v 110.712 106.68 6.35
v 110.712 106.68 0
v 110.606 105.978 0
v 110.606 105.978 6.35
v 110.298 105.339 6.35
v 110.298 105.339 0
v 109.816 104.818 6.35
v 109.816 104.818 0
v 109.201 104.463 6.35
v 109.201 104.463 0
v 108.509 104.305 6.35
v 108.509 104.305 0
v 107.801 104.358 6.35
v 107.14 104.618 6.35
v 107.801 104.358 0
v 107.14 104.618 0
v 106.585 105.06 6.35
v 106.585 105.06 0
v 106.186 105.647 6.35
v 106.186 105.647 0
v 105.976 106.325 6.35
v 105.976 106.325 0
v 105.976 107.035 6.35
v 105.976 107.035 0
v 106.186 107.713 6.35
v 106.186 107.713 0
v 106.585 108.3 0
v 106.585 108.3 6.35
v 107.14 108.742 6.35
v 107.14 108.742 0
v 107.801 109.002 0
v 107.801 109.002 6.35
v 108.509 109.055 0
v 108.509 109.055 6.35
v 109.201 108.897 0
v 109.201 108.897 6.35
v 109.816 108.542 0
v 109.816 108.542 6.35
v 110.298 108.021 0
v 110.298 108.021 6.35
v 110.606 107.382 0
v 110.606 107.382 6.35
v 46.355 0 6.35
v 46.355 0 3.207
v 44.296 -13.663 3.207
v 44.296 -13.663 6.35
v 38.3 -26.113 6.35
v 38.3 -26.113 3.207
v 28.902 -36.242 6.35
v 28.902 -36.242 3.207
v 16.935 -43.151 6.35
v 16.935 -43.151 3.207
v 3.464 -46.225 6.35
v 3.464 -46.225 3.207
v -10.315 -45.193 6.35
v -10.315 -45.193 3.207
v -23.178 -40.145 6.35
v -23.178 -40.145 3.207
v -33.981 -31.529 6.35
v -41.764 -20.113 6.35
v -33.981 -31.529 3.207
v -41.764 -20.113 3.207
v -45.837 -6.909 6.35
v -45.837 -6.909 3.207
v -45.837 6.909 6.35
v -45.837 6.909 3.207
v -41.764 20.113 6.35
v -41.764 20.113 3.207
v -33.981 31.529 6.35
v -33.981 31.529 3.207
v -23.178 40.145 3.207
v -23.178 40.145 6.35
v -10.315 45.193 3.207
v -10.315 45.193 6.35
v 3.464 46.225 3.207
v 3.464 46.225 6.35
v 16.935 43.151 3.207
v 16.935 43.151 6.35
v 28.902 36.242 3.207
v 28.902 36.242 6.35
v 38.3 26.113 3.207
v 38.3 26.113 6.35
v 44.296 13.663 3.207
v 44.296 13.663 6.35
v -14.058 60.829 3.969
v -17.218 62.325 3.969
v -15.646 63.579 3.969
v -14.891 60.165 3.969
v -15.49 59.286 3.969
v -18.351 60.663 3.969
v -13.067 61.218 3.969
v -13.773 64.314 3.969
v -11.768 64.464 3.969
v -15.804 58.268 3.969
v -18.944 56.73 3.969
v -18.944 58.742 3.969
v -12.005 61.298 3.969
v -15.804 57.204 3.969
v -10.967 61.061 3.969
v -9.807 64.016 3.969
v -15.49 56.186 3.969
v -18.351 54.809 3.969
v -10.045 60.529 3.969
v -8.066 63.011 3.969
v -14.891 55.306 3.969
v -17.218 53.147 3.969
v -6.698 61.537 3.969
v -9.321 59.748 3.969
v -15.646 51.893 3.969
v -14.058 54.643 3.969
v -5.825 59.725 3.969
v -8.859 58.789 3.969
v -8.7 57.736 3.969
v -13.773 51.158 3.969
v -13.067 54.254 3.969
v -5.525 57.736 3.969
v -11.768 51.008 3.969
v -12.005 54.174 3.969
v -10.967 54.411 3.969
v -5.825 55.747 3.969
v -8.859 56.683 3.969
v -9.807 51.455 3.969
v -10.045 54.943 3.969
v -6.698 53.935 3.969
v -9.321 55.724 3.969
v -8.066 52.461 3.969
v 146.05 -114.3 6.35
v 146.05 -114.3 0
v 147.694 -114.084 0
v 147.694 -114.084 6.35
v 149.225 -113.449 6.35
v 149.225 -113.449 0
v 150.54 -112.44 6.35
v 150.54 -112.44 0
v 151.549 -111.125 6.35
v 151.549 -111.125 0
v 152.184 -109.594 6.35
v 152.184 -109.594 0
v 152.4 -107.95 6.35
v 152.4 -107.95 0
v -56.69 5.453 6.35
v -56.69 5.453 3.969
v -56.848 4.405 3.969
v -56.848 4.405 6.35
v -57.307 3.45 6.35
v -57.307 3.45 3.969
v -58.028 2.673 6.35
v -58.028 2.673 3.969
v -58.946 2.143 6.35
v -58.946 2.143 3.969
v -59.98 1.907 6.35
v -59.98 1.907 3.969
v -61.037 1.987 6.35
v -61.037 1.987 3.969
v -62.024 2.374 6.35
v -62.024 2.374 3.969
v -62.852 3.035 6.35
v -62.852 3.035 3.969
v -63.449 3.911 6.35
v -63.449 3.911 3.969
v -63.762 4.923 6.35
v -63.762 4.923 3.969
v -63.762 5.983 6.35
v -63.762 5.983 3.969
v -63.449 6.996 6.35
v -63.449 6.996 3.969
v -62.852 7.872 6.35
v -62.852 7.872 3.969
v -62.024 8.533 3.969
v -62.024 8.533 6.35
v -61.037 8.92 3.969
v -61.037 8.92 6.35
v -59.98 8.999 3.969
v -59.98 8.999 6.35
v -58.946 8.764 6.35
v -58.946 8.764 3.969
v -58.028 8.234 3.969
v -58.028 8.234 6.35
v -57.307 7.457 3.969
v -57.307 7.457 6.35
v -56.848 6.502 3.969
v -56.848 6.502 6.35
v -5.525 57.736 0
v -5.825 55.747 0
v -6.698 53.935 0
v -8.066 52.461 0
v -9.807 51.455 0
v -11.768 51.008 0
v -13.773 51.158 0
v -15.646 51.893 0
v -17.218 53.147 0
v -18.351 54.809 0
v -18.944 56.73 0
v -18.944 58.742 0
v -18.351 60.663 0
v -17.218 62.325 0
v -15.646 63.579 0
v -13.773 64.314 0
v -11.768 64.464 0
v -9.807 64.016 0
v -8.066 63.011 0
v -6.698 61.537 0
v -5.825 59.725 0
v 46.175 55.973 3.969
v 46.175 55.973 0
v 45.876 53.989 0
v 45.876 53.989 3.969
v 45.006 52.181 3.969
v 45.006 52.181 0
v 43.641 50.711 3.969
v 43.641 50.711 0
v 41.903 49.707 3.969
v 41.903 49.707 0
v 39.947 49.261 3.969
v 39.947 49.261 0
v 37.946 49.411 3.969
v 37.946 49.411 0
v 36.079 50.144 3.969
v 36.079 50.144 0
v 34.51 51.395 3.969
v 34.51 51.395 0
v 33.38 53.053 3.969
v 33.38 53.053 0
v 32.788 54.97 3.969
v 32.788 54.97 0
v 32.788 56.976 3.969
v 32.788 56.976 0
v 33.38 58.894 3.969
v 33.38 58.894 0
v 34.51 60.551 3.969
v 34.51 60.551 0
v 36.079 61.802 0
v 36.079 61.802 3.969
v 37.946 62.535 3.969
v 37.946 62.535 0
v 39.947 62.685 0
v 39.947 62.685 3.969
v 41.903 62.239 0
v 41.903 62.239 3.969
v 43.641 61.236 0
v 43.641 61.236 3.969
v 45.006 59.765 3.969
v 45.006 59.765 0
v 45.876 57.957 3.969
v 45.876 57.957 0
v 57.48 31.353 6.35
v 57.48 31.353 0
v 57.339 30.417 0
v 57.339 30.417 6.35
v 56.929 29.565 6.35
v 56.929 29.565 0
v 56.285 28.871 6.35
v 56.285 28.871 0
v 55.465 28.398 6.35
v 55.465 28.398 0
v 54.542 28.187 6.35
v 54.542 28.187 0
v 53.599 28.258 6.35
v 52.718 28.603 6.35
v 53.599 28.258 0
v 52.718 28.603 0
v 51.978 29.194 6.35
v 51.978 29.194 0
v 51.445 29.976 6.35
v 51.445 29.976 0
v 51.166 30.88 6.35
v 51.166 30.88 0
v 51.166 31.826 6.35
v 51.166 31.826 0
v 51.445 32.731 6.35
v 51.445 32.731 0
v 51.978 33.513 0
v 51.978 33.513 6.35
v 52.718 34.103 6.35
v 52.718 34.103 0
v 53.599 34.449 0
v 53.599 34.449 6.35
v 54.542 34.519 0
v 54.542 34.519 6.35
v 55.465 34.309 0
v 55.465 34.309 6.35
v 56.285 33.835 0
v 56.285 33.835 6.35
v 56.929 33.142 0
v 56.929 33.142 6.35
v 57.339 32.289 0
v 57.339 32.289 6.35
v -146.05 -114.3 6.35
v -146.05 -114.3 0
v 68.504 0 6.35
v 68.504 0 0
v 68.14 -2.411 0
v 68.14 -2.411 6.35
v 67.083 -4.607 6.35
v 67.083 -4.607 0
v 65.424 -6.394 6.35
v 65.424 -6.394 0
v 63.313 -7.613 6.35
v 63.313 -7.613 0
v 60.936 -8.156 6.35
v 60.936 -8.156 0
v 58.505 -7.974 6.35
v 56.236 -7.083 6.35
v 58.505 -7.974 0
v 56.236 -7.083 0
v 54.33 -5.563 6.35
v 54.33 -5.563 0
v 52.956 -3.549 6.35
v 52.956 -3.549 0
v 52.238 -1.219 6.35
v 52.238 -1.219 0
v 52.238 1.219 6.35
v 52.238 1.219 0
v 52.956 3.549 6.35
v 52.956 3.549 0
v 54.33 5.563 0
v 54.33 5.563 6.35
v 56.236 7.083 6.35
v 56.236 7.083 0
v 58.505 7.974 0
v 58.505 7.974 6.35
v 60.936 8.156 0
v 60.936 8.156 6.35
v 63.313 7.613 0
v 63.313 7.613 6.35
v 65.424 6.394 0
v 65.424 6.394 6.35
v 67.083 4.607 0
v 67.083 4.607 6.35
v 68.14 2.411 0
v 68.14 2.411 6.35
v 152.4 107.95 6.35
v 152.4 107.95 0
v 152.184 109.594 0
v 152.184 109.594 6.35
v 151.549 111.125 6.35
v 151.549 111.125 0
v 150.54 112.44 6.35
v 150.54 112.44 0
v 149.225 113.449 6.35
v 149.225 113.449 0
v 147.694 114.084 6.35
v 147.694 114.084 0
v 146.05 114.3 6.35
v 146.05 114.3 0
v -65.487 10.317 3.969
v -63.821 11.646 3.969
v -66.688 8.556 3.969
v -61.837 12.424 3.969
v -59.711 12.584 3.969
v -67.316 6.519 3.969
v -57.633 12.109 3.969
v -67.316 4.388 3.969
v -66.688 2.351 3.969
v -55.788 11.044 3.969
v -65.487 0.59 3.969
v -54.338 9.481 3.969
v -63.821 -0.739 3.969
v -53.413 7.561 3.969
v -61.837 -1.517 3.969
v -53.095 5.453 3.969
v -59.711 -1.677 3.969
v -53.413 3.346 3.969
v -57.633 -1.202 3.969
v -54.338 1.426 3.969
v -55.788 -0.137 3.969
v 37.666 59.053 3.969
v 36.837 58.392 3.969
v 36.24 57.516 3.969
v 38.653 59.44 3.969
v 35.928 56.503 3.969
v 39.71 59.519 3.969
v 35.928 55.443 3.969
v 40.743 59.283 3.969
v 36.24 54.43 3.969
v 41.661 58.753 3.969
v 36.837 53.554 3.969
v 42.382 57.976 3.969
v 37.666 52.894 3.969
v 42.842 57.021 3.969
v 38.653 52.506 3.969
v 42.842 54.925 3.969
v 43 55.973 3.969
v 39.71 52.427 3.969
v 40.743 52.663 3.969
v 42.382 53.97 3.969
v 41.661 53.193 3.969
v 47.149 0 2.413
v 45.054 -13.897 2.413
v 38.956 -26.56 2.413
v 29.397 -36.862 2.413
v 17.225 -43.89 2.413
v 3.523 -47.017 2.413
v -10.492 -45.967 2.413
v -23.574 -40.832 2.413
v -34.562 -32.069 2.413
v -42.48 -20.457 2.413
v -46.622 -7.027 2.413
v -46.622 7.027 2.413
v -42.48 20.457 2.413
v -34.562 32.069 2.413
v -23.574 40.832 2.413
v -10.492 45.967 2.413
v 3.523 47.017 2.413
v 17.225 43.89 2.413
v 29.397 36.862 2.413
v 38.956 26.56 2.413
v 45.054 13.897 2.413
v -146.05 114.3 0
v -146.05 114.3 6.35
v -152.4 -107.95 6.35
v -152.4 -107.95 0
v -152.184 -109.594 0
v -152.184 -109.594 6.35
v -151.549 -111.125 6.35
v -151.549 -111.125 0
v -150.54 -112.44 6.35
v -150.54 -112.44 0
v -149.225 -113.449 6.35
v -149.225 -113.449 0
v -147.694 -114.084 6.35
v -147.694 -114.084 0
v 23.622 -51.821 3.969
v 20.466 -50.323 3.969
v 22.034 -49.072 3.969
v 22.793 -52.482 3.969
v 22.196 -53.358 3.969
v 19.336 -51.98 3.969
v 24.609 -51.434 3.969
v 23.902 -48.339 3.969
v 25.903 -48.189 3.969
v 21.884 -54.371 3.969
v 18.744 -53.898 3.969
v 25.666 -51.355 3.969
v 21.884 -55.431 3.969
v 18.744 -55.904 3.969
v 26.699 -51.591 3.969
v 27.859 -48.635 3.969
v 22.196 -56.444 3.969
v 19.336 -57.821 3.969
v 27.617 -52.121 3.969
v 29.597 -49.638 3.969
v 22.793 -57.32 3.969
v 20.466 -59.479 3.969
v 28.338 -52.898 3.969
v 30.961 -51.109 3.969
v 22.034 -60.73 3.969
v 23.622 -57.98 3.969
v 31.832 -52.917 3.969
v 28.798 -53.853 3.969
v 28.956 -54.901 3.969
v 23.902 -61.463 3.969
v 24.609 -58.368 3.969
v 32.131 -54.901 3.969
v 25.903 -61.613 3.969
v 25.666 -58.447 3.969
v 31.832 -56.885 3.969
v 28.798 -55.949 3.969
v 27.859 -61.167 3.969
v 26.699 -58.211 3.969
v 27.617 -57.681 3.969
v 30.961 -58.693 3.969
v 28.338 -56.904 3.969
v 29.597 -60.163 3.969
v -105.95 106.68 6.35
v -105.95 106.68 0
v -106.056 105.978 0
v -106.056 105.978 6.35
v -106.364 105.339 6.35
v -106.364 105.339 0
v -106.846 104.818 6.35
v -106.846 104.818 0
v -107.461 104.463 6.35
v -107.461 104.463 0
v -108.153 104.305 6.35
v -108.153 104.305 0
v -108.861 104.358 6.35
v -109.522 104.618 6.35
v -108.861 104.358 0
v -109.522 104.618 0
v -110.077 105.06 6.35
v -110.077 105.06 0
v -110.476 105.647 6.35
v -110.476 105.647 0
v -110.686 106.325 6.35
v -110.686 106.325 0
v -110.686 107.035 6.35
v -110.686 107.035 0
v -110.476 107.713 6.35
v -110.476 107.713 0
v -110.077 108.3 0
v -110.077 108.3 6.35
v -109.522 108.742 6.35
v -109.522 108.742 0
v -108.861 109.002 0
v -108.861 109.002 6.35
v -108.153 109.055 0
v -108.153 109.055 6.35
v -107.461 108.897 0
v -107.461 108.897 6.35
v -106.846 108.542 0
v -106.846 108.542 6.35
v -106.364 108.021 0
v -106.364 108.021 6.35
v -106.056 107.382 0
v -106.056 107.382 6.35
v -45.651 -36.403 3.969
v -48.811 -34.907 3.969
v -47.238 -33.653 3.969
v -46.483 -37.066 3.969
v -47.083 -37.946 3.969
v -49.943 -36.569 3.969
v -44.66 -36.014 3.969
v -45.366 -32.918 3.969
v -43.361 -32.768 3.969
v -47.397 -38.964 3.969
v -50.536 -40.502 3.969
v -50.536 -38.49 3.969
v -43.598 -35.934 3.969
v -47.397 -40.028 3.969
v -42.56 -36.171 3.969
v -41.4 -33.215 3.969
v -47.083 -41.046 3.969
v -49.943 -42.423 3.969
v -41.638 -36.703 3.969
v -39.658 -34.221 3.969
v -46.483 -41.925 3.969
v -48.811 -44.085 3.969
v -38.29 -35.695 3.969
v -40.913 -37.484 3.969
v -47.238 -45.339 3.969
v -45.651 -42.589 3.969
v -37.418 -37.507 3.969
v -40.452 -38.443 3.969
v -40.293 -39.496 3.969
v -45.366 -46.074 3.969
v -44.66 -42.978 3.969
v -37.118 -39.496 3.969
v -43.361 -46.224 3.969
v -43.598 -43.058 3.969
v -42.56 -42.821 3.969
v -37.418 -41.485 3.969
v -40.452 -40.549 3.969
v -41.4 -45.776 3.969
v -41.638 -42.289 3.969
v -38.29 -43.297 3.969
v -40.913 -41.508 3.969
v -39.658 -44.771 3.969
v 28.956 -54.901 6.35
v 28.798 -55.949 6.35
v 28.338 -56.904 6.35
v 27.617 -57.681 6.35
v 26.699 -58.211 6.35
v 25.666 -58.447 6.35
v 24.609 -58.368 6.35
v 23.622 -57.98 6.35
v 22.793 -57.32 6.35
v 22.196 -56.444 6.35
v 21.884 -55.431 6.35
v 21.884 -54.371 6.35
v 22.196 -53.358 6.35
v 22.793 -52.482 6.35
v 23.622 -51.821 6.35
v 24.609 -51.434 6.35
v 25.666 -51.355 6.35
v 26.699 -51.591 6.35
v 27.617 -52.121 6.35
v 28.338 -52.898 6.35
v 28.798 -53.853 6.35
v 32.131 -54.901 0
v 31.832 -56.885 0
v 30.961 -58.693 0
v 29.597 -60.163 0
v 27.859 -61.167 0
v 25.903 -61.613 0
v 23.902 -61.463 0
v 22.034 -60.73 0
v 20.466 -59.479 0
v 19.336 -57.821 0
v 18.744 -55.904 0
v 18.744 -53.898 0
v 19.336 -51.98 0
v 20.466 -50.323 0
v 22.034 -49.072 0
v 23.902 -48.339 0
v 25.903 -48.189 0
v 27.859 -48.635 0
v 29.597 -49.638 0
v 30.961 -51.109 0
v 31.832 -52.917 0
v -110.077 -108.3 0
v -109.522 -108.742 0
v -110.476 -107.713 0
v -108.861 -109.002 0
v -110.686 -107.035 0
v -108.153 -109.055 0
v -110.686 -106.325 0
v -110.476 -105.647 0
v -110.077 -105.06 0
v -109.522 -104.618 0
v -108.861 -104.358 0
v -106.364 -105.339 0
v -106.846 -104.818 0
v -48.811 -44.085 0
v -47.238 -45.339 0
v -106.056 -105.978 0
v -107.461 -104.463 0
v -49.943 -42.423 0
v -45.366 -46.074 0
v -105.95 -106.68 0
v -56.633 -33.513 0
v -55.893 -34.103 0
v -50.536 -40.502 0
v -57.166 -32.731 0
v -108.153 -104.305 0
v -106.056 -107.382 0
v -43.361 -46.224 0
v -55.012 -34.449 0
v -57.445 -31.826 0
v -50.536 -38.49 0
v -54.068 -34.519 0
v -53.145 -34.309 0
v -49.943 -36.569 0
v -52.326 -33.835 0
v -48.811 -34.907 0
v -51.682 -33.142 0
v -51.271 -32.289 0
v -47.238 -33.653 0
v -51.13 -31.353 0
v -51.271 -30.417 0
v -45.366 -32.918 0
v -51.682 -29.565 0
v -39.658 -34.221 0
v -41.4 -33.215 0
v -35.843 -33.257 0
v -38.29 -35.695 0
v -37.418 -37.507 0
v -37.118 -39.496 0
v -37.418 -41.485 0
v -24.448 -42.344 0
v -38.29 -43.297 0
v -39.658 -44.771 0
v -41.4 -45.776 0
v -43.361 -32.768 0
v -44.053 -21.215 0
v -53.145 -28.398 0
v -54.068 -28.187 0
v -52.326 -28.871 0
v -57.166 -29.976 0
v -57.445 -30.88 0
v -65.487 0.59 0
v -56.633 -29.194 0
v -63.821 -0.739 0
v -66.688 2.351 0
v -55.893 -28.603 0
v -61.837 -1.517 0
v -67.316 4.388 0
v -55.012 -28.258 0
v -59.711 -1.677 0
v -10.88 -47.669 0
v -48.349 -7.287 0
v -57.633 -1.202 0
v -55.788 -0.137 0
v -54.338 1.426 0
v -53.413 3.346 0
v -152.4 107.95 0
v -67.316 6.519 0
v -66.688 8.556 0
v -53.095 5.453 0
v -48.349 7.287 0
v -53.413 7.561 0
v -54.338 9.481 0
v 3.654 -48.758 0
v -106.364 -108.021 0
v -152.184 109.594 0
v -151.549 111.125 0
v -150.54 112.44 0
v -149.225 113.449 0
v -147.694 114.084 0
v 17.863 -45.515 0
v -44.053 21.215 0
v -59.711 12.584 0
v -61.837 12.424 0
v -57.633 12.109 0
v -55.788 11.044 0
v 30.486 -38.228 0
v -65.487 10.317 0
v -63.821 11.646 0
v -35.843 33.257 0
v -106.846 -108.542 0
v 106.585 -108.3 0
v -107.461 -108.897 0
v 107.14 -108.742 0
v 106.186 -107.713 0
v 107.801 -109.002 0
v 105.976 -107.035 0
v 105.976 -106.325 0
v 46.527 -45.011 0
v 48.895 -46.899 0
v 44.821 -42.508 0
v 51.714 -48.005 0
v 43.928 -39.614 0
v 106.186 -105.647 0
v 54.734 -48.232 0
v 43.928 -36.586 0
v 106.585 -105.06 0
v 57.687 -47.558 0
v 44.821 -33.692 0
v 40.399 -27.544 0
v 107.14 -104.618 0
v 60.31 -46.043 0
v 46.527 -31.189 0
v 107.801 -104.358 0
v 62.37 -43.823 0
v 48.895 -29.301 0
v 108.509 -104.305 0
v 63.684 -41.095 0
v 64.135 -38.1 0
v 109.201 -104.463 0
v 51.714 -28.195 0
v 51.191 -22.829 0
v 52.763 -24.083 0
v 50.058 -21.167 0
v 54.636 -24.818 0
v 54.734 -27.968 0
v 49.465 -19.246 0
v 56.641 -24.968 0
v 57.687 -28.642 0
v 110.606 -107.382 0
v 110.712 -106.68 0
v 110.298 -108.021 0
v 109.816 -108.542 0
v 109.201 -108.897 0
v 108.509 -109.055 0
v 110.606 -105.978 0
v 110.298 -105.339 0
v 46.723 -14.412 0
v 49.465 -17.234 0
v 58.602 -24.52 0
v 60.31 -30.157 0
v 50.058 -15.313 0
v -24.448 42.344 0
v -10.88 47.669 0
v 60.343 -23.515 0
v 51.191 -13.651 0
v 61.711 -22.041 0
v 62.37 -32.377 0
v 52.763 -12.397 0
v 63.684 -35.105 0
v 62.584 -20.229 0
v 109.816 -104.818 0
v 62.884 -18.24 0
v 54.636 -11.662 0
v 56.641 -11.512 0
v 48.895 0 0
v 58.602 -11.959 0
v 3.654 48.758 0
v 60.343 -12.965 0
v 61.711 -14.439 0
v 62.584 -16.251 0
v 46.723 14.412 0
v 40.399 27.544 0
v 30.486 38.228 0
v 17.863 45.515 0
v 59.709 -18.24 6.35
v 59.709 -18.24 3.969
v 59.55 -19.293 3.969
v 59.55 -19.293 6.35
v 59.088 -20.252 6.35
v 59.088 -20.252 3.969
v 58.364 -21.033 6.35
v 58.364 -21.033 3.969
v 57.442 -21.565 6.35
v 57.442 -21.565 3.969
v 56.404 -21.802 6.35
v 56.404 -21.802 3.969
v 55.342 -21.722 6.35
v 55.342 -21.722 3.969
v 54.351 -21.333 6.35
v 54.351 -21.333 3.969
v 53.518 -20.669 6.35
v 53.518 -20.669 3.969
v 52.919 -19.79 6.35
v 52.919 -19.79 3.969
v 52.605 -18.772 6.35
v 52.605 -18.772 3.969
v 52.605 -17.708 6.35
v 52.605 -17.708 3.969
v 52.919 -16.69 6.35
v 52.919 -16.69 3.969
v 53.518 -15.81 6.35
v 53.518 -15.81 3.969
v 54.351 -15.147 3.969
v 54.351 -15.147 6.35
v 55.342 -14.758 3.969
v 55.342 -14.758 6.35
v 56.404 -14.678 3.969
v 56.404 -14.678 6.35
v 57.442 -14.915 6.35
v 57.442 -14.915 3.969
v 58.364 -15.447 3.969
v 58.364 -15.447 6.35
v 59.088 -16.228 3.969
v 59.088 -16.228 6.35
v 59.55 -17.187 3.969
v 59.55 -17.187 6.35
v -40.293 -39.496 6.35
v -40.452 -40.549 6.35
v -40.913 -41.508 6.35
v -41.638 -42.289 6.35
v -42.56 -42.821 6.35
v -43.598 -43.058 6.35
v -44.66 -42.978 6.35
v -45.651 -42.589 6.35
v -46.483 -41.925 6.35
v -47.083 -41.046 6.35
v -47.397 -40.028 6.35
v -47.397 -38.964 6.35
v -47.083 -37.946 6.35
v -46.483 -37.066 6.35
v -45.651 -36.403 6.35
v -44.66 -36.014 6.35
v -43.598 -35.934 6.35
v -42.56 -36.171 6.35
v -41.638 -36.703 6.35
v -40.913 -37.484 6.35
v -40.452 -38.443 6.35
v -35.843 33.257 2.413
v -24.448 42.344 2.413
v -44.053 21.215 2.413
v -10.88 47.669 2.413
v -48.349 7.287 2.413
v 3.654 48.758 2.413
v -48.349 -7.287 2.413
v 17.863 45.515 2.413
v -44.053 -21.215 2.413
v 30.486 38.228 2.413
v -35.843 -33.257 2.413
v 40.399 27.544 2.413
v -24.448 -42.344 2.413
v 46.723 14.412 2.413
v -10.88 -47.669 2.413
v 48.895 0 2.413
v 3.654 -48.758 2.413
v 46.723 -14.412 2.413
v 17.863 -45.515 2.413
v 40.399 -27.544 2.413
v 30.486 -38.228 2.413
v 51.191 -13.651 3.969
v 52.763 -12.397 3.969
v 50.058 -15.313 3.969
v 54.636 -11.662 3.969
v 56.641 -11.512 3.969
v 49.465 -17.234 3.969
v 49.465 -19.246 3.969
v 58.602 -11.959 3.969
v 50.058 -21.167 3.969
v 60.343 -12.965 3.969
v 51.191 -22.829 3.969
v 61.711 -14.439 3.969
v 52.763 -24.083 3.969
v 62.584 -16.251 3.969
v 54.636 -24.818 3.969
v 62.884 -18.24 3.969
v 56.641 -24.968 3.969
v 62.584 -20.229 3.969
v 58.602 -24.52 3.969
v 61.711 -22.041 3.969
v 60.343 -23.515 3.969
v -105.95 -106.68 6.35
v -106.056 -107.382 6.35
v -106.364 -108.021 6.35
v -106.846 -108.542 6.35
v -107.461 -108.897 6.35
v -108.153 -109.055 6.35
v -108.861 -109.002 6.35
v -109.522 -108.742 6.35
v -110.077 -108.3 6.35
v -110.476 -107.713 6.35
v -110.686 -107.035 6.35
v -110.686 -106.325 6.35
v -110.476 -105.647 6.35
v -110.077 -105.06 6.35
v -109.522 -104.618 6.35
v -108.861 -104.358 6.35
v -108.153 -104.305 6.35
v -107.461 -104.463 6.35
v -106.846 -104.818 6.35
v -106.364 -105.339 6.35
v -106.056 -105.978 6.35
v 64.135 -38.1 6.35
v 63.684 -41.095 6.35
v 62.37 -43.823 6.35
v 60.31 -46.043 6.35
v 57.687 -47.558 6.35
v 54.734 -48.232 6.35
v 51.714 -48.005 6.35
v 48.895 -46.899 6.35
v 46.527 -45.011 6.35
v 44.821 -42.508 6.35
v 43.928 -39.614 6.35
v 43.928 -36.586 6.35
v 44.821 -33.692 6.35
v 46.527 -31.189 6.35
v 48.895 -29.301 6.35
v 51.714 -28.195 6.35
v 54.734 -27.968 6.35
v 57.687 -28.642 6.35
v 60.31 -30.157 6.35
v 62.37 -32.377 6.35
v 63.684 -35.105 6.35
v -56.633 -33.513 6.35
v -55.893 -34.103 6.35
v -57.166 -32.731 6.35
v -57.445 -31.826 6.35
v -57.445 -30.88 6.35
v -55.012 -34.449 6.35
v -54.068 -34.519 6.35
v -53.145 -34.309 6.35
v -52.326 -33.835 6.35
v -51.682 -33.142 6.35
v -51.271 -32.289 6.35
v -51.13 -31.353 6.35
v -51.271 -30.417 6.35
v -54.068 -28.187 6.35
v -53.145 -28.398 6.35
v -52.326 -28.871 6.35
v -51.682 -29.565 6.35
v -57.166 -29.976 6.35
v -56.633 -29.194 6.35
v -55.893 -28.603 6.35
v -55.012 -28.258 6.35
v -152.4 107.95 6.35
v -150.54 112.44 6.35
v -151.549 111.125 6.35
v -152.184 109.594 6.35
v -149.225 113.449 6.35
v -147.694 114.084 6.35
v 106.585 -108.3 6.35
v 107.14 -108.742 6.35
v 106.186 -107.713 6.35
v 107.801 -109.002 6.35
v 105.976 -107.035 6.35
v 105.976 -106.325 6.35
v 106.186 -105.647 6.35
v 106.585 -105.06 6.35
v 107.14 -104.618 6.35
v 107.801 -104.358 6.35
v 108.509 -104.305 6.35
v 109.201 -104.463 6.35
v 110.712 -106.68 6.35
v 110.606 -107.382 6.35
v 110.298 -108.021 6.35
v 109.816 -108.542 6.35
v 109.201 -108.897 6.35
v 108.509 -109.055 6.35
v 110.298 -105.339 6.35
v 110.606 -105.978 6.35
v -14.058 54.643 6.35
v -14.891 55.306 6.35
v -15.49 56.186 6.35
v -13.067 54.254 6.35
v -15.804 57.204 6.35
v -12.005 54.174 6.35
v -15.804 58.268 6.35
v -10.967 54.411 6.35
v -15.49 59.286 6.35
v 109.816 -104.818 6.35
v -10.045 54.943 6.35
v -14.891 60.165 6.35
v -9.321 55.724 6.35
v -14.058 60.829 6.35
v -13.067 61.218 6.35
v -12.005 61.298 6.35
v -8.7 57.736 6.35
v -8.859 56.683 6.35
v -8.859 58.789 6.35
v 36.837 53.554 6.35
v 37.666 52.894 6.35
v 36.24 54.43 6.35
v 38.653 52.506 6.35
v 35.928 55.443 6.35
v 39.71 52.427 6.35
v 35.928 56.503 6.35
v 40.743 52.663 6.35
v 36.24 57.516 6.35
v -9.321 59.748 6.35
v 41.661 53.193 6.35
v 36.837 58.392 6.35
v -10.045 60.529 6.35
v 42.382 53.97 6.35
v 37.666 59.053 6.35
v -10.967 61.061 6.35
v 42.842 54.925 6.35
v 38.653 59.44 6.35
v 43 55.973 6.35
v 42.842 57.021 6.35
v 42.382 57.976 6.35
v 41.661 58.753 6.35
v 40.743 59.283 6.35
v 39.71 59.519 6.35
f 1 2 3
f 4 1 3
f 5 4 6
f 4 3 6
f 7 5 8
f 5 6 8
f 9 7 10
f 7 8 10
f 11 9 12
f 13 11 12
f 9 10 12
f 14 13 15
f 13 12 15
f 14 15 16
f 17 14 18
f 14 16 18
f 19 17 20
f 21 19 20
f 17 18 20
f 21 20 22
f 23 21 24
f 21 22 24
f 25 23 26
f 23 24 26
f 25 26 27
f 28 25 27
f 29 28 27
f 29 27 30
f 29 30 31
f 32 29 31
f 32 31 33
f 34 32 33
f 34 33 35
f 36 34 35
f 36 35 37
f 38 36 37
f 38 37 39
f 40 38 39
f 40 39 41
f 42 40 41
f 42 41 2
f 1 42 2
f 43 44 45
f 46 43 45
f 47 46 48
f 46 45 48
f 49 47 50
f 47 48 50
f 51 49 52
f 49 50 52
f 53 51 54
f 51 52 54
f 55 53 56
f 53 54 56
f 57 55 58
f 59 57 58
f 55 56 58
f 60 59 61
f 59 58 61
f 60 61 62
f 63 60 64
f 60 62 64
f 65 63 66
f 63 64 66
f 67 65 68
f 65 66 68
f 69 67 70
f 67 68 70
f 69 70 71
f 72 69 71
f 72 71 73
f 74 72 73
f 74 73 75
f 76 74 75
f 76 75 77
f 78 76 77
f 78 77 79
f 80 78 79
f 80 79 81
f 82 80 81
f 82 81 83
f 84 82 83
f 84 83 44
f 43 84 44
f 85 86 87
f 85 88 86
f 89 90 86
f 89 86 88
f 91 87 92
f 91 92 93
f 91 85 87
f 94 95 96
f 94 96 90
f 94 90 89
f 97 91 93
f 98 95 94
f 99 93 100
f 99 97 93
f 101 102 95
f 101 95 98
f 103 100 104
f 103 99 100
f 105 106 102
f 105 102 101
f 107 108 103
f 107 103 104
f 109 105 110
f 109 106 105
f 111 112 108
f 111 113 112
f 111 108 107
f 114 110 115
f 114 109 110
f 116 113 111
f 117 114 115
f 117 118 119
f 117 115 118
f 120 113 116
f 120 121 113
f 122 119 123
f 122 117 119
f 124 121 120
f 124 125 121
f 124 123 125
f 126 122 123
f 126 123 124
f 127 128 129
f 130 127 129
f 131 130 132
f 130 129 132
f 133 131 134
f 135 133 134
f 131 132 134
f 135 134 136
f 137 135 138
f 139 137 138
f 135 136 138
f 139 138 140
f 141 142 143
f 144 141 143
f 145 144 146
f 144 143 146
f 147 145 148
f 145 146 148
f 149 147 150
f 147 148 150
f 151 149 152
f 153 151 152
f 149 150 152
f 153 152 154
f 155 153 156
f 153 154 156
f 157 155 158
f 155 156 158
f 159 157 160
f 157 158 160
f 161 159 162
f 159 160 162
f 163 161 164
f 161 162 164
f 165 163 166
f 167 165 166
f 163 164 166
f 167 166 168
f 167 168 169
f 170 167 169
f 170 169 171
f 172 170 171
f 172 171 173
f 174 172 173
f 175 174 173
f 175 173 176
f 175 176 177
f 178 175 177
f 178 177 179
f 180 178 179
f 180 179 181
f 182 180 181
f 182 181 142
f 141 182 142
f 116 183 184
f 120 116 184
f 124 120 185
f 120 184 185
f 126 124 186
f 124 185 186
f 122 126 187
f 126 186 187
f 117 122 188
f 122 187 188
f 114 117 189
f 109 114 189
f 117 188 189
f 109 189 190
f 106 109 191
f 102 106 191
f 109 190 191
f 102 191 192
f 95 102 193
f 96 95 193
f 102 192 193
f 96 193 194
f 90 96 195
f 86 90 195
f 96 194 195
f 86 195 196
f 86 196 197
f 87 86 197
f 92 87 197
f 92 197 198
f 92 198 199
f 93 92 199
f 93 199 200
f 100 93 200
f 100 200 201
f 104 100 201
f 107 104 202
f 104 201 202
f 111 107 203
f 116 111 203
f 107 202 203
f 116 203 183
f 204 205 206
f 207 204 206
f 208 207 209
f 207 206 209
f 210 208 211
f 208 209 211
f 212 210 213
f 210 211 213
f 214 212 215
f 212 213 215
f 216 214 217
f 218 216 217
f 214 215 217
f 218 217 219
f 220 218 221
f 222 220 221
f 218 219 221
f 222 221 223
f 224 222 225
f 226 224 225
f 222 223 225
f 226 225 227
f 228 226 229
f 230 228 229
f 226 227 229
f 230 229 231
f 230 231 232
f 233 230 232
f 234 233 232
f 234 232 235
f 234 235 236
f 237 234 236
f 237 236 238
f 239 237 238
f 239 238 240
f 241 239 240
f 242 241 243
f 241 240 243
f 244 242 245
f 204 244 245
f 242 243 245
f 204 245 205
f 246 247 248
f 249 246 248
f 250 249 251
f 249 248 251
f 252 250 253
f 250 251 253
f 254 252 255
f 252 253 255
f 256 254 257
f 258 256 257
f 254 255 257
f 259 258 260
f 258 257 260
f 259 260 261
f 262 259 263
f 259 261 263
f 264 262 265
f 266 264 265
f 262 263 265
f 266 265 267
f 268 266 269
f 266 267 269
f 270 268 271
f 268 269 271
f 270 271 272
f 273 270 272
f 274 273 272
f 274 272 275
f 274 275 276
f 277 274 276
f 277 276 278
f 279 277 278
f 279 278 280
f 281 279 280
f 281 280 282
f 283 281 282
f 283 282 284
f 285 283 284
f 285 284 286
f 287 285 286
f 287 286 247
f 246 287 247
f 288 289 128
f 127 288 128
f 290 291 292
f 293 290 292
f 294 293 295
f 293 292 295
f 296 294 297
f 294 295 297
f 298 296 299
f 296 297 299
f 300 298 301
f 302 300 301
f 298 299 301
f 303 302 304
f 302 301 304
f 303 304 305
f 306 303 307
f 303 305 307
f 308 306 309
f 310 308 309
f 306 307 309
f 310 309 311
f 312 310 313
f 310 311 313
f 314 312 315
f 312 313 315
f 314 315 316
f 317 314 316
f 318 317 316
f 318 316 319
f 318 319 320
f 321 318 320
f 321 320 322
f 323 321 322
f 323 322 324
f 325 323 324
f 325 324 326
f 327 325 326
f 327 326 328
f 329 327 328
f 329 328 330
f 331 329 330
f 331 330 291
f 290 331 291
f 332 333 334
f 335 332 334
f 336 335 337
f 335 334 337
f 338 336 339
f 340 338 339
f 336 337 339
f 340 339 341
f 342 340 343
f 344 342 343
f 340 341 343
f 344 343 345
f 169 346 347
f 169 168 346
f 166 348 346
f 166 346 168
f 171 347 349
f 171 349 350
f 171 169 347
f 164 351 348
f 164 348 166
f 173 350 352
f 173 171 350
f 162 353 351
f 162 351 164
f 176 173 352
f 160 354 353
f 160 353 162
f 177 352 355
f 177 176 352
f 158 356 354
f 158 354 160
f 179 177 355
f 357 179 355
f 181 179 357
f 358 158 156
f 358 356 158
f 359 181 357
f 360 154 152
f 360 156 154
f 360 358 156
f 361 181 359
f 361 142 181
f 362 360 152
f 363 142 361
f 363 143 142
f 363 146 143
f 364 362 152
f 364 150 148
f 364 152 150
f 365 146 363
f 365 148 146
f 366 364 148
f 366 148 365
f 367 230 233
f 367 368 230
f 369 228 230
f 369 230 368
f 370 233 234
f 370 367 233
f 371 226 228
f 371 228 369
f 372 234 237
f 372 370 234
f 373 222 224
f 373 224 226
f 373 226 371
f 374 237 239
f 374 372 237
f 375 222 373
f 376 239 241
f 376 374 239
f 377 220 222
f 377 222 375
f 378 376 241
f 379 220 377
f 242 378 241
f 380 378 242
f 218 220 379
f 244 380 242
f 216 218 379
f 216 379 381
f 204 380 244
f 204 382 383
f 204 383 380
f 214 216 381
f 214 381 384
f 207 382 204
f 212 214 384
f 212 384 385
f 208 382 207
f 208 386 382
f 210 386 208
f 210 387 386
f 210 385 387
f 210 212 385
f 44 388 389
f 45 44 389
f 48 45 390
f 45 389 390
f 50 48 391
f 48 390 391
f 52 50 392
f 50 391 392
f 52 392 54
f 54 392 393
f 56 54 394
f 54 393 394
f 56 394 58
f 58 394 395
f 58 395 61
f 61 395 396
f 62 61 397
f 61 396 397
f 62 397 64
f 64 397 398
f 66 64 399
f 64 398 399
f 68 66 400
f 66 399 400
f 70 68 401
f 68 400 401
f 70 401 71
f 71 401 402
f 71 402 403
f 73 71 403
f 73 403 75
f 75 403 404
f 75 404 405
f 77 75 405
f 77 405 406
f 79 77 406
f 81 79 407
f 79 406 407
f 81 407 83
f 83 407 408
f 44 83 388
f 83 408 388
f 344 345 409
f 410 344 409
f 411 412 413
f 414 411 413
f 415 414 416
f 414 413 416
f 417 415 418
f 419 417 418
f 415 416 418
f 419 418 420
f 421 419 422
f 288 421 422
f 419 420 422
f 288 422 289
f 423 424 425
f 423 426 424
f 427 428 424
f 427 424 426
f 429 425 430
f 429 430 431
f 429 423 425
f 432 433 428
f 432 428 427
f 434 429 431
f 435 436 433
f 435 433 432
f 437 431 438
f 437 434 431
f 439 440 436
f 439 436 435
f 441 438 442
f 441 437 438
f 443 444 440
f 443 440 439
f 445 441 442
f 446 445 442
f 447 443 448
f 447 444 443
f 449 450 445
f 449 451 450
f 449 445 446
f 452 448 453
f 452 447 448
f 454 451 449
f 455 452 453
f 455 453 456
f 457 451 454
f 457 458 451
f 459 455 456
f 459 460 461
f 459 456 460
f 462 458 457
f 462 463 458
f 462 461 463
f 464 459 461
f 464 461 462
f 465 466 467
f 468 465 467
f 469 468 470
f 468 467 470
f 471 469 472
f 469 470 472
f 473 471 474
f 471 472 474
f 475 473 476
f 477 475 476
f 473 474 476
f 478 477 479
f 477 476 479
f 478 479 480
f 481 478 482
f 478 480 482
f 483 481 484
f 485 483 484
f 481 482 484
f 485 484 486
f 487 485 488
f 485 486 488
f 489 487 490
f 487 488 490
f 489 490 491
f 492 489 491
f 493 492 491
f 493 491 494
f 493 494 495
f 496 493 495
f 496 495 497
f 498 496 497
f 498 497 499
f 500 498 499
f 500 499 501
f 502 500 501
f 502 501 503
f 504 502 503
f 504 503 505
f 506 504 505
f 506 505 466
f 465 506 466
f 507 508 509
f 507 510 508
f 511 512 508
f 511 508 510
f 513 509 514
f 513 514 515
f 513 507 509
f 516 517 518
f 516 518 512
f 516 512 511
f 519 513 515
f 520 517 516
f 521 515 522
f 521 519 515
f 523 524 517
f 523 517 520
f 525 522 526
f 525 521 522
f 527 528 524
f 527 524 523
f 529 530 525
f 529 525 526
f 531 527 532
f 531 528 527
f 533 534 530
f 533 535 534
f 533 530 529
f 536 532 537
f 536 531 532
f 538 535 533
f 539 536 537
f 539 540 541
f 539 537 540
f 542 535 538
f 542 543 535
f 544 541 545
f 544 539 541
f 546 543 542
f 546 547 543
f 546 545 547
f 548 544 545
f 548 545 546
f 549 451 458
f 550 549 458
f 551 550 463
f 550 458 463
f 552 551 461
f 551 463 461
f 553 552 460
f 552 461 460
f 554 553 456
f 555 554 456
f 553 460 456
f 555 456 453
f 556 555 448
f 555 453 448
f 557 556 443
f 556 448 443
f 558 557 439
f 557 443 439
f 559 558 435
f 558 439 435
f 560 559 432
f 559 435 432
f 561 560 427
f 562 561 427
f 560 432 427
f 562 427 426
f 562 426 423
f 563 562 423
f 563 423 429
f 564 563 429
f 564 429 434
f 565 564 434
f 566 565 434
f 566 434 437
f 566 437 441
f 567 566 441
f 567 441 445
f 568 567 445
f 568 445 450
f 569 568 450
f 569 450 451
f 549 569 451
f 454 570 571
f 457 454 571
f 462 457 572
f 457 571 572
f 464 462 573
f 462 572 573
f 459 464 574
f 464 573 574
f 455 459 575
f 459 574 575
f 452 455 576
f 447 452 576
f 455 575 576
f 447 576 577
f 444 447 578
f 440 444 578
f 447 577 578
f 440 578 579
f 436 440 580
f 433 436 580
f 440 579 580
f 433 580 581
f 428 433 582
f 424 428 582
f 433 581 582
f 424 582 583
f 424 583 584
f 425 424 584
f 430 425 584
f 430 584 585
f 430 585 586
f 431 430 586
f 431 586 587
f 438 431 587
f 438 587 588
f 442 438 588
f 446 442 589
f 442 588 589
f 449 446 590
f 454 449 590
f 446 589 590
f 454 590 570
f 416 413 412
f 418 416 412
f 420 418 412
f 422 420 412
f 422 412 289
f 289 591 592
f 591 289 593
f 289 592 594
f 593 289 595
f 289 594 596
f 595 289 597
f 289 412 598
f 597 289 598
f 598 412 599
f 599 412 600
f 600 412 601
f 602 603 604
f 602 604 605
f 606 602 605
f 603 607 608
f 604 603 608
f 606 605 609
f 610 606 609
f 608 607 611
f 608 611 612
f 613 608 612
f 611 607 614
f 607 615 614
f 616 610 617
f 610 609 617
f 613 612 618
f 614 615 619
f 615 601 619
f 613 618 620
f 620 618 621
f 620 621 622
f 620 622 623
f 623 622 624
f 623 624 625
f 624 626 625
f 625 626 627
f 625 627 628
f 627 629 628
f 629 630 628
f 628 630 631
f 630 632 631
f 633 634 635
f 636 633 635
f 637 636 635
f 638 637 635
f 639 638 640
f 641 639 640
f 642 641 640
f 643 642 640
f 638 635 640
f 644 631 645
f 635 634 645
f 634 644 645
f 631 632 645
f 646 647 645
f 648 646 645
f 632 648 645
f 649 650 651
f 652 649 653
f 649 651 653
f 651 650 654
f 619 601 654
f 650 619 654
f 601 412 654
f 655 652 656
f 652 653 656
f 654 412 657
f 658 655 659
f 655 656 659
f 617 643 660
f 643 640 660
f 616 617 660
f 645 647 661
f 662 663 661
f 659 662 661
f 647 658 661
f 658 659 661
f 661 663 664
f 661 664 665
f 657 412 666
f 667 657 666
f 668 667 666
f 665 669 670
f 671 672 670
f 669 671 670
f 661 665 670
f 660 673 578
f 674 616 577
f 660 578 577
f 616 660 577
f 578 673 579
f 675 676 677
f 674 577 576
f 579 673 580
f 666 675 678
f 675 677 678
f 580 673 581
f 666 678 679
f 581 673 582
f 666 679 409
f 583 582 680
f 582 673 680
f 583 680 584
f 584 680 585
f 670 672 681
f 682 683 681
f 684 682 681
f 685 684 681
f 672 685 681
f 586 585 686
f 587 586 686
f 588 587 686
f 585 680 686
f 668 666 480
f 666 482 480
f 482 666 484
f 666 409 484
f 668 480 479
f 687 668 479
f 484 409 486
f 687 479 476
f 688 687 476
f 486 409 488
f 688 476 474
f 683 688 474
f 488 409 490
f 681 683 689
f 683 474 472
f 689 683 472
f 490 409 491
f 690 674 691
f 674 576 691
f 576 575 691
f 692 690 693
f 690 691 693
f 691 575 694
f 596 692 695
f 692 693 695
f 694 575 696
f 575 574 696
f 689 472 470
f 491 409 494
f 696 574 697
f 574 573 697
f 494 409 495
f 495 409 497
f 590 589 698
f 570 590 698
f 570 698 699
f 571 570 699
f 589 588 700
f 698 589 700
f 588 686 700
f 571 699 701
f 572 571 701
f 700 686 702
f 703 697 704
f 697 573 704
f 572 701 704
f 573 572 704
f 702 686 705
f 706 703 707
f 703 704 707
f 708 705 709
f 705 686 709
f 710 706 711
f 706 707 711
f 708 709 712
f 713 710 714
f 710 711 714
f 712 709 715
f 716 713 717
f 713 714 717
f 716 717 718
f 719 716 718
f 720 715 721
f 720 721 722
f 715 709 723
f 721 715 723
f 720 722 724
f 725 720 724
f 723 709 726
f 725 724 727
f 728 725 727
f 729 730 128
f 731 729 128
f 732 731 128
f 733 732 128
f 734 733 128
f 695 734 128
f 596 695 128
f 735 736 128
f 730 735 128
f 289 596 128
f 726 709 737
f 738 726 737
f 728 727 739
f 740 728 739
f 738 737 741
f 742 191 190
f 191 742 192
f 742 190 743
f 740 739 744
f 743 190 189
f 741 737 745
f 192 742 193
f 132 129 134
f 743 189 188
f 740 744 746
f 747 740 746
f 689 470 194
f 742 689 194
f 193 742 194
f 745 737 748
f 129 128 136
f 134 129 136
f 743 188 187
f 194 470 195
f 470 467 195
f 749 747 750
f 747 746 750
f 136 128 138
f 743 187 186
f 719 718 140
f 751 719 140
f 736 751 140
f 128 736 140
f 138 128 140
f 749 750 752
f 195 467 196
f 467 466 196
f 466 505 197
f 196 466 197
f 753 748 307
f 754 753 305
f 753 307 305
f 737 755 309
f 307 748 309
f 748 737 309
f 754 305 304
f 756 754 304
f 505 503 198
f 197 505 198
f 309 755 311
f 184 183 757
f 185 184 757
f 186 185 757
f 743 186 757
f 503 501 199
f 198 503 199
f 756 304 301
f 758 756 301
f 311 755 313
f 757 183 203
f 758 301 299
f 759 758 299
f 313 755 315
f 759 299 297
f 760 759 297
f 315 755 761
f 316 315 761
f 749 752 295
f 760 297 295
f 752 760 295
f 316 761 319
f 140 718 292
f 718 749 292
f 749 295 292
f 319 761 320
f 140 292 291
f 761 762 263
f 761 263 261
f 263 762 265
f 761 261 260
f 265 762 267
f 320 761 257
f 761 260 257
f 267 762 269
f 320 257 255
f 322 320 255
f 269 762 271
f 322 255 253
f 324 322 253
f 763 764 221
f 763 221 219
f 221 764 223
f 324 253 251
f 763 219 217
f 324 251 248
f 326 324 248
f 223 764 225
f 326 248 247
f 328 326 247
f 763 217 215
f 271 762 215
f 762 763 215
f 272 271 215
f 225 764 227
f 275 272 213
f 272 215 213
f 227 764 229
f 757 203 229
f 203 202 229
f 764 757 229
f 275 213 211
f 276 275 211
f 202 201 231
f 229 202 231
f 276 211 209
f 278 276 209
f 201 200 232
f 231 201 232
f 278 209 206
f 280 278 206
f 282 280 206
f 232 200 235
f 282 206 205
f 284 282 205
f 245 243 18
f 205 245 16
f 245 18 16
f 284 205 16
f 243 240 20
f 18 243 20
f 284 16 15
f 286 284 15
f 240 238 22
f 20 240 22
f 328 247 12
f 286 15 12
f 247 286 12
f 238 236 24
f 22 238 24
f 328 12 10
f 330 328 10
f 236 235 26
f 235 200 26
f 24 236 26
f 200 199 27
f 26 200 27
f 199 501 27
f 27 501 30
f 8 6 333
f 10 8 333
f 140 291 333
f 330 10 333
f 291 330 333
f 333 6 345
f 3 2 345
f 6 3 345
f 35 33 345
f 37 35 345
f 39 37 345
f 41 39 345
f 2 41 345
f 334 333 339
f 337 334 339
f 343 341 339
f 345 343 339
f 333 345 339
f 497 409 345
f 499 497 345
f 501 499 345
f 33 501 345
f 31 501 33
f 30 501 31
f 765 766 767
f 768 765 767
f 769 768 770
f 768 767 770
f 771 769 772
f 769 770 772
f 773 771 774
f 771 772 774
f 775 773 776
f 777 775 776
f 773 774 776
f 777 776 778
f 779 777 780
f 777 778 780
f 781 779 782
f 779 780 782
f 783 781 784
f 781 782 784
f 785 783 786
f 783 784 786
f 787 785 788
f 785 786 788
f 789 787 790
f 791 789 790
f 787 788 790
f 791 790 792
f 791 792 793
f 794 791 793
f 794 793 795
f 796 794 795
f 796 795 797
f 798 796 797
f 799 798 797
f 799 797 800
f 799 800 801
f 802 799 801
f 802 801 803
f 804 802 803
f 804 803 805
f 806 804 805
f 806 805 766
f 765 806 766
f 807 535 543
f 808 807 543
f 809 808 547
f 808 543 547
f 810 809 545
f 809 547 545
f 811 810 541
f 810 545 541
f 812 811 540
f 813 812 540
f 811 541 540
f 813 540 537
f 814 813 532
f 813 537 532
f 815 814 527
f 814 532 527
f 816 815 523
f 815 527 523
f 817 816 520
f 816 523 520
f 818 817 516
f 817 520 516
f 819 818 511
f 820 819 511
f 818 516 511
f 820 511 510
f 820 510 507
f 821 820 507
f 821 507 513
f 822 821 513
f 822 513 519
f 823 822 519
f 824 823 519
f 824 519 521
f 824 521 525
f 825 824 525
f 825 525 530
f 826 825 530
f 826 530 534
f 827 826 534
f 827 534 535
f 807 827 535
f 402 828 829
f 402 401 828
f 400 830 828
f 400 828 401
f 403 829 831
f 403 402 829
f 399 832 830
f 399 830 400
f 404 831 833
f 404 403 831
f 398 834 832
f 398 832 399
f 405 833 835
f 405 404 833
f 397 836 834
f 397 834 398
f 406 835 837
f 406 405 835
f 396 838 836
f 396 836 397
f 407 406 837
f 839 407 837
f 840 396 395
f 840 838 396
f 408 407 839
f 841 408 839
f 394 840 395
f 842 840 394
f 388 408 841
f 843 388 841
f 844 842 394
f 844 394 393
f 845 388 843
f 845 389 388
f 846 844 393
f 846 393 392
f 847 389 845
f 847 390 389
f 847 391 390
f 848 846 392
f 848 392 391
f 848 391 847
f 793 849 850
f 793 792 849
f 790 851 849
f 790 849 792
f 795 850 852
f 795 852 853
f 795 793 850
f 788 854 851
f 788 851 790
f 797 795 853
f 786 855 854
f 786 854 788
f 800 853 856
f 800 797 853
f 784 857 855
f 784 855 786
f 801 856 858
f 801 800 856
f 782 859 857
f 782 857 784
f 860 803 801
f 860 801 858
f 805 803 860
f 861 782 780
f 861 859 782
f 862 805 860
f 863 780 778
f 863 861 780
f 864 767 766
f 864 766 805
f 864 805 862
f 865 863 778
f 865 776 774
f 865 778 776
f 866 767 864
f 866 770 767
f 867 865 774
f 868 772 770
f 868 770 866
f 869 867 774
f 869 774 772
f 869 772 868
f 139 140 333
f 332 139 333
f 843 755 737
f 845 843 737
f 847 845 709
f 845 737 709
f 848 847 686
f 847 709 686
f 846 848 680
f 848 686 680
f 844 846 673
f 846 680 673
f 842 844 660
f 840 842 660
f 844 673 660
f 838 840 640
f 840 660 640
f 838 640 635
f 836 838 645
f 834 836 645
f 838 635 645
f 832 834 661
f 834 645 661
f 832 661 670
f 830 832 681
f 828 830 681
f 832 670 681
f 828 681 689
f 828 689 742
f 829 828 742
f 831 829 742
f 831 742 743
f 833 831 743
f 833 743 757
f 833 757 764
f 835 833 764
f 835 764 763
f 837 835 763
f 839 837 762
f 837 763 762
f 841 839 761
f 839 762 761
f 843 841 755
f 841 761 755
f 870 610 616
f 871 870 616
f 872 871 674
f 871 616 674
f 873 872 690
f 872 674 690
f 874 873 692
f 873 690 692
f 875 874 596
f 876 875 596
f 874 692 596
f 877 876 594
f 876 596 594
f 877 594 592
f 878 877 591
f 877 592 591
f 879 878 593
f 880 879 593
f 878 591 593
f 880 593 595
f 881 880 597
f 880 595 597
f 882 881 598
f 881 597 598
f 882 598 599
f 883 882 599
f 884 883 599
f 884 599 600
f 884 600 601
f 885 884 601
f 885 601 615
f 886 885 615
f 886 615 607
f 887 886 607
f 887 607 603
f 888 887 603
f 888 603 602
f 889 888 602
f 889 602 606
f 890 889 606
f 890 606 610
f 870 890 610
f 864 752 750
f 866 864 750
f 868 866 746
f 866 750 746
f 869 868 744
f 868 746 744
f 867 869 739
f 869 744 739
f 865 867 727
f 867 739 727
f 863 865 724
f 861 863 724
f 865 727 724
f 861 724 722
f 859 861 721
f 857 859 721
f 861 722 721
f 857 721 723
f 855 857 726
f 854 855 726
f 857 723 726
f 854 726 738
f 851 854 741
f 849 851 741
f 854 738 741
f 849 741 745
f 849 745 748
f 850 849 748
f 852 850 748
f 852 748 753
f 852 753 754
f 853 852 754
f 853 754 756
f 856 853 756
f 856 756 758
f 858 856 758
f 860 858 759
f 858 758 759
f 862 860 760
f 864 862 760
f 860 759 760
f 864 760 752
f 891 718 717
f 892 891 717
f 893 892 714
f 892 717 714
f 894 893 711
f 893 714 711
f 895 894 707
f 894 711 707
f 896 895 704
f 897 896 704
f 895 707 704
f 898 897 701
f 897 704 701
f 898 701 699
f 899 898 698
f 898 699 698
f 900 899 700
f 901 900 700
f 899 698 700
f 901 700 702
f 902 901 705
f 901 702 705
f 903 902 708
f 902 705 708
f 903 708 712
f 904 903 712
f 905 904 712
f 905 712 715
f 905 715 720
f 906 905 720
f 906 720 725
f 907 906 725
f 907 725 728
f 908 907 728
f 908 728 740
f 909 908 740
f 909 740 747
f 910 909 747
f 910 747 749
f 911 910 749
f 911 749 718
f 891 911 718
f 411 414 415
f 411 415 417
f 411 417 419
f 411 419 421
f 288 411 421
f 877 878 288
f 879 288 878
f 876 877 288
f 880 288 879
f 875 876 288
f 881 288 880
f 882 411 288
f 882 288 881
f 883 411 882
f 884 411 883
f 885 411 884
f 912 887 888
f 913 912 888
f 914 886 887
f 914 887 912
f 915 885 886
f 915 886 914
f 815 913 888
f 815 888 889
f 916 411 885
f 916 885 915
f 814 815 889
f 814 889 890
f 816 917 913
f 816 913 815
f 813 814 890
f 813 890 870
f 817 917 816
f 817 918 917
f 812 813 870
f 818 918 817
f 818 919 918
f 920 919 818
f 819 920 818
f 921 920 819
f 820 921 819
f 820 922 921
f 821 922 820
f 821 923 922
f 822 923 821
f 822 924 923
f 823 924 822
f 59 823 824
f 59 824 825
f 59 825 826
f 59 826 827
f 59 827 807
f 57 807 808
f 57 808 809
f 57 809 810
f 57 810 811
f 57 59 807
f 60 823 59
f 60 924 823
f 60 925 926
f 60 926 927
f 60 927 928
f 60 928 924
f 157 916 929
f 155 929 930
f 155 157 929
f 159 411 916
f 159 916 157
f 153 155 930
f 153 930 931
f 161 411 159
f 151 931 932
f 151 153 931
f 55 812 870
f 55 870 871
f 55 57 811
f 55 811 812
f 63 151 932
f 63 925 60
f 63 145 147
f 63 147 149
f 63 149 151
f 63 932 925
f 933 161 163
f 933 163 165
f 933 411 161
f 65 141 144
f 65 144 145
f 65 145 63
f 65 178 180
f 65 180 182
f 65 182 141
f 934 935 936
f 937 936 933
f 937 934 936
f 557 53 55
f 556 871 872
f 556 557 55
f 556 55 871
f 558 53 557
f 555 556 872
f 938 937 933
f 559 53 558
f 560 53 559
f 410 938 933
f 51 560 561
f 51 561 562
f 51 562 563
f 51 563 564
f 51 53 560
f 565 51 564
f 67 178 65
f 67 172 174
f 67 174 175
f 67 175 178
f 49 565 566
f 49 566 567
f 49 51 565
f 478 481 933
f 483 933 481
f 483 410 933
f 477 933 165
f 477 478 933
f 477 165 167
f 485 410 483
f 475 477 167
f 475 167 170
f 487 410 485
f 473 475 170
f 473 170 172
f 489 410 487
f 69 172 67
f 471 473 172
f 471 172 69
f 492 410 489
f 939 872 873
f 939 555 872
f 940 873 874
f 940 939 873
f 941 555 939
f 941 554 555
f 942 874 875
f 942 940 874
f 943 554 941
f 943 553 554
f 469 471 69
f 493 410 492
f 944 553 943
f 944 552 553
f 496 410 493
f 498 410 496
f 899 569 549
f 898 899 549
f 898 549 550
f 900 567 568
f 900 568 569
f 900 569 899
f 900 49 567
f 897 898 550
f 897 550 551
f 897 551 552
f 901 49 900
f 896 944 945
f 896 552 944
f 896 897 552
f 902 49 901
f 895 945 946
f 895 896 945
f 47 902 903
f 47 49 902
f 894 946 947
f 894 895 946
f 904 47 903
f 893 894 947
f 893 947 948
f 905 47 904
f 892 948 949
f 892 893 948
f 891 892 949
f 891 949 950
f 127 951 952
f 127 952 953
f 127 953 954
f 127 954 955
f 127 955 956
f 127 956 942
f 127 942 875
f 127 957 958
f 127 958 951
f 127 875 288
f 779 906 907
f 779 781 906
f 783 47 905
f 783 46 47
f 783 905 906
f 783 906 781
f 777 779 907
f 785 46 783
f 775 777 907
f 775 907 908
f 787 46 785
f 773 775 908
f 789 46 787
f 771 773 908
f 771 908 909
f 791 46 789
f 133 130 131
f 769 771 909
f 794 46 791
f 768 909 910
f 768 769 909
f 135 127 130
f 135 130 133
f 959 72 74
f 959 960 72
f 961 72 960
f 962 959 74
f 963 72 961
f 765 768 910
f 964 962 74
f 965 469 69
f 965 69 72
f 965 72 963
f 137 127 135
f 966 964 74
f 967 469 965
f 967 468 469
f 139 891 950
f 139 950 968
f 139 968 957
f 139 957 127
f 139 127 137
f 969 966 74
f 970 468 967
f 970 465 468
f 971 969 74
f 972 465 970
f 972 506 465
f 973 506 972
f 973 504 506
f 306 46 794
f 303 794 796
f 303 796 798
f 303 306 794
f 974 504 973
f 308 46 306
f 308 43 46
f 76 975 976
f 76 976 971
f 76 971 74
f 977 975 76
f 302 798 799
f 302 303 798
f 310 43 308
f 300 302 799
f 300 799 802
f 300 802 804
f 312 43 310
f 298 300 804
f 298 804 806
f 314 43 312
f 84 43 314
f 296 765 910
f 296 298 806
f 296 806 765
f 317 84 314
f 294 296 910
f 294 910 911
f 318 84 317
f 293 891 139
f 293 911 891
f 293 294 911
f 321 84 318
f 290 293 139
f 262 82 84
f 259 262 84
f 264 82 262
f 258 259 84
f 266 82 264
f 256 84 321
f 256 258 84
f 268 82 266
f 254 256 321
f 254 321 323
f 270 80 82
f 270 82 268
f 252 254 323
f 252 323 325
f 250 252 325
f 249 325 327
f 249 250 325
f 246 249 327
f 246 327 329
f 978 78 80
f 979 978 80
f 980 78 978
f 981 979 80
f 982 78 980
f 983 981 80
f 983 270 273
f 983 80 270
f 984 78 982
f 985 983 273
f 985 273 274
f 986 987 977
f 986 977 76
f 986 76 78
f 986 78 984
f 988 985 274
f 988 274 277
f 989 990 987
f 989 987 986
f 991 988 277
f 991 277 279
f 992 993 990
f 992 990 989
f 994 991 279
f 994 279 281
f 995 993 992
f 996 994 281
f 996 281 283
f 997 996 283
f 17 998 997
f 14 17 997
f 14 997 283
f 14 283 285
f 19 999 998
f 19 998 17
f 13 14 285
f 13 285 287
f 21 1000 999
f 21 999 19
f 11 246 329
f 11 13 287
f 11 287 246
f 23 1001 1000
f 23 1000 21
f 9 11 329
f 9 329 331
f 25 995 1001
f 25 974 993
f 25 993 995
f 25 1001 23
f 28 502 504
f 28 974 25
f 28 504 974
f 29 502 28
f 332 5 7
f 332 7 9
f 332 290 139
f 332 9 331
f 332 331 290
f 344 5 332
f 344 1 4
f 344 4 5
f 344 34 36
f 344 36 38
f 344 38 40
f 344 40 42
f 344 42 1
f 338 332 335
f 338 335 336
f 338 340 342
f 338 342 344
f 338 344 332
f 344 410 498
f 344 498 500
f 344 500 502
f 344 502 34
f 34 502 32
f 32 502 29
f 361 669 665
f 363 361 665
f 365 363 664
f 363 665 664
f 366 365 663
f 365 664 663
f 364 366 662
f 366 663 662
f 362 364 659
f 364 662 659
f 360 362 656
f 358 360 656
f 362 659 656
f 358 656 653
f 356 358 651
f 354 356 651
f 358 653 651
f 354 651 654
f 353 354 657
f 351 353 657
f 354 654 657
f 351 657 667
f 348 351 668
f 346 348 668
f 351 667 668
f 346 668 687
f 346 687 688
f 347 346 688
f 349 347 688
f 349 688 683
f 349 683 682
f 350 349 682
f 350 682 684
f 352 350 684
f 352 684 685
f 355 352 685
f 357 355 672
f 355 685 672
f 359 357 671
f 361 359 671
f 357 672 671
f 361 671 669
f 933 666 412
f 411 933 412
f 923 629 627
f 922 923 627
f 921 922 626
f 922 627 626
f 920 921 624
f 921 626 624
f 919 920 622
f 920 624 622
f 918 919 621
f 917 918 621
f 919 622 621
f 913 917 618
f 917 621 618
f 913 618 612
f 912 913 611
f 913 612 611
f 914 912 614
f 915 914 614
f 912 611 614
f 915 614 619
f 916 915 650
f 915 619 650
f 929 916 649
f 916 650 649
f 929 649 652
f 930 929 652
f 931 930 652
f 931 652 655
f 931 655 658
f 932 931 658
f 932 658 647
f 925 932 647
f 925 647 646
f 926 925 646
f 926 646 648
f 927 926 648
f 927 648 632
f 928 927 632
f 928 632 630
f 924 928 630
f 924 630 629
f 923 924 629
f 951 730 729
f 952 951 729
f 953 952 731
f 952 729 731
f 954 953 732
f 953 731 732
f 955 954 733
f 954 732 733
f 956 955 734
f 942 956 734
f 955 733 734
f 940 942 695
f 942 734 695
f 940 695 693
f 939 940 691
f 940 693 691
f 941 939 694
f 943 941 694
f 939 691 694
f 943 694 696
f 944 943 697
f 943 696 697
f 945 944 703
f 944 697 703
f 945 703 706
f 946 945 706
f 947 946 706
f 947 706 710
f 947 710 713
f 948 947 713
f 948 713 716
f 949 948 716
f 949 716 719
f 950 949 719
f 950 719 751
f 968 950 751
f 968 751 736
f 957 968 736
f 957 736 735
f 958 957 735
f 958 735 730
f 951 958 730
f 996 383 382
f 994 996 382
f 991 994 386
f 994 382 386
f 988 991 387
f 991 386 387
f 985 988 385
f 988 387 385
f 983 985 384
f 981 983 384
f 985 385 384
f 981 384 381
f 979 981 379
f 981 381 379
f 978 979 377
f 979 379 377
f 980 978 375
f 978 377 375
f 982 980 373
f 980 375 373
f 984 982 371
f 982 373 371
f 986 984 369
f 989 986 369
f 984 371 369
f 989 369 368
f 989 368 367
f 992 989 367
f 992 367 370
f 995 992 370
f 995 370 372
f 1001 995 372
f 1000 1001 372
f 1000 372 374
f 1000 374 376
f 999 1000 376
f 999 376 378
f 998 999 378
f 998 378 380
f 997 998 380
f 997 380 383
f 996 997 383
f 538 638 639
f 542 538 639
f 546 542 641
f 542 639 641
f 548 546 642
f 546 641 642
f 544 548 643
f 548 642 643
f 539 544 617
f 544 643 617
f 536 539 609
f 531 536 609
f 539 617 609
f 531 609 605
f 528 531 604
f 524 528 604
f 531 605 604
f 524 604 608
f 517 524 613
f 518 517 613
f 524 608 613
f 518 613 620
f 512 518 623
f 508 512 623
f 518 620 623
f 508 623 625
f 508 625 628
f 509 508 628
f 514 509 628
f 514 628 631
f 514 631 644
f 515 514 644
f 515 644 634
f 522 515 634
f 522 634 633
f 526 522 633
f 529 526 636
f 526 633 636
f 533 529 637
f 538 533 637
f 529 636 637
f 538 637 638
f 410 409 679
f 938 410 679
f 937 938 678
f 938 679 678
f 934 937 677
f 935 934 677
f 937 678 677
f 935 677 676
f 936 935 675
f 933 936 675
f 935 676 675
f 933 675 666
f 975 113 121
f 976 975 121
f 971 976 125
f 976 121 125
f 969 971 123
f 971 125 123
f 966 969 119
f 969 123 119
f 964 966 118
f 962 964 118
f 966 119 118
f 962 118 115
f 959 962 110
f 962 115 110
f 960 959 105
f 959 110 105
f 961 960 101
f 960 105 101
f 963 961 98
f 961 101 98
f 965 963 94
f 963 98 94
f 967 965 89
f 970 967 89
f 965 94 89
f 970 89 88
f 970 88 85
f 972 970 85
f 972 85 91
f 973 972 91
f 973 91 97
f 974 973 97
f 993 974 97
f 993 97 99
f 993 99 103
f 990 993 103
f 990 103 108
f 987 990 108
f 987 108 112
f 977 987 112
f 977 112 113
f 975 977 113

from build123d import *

# Parameters (mm, degrees)
F1_DEPTH  = 6.35
F2_R      = 46.355
F2_R_2    = 8.1788
F2_R_3    = 10.16
F2_R_4    = 3.175
F2_R_5    = 3.556
F2_R_6    = 2.38125
F3_DEPTH  = 6.351
F4_R      = 48.895
F5_DEPTH  = 2.413
F6_SIZE   = 0.79375
F7_R      = 6.731
F7_R_2    = 7.1501
F8_DEPTH  = 3.96875
F9_R      = 3.571875
F10_DEPTH = 6.351
F11_R     = 6.746875
F12_DEPTH = 3.96875


with BuildPart() as f1:
    # F0 (on Top) → F1 (new body)
    with BuildSketch(Plane.XY):
        with BuildLine():
            ThreePointArc((152.4, 107.95), (150.540128, 112.440128), (146.05, 114.3))
            Line((146.05, 114.3), (-146.05, 114.3))
            ThreePointArc((-146.05, 114.3), (-150.540128, 112.440128), (-152.4, 107.95))
            Line((-152.4, 107.95), (-152.4, -107.95))
            ThreePointArc((-152.4, -107.95), (-150.540128, -112.440128), (-146.05, -114.3))
            Line((-146.05, -114.3), (146.05, -114.3))
            ThreePointArc((146.05, -114.3), (150.540128, -112.440128), (152.4, -107.95))
            Line((152.4, -107.95), (152.4, 107.95))
        make_face()
    extrude(amount=F1_DEPTH)

    # F2 (on face) → F3 (cut, through all)
    with BuildSketch(Plane(origin=(0, 0, 0), x_dir=(1, 0, 0), z_dir=(0, 0, -1))):
        Circle(F2_R)
        with Locations((60.325, 0)):
            Circle(F2_R_2)
        with Locations((53.975, 38.1)):
            Circle(F2_R_3)
        with Locations((54.305205, -31.353125)):
            Circle(F2_R_4)
        with Locations((-54.305205, 31.353125)):
            Circle(F2_R_4)
        with Locations((25.4, 54.900886)):
            Circle(F2_R_5)
        with Locations((-60.245562, -5.453398)):
            Circle(F2_R_5)
        with Locations((39.444204, -55.973177)):
            Circle(F2_R_5)
        with Locations((108.331, 106.68)):
            Circle(F2_R_6)
        with Locations((-108.331, 106.68)):
            Circle(F2_R_6)
        with Locations((-108.331, -106.68)):
            Circle(F2_R_6)
        with Locations((108.331, -106.68)):
            Circle(F2_R_6)
    extrude(amount=-F3_DEPTH, mode=Mode.SUBTRACT)

    # F4 (on face) → F5 (cut)
    with BuildSketch(Plane(origin=(0, 0, 0), x_dir=(1, 0, 0), z_dir=(0, 0, -1))):
        Circle(F4_R)
    extrude(amount=-F5_DEPTH, mode=Mode.SUBTRACT)

    # F6
    f6_edges = [f1.edges().sort_by_distance(p)[0] for p in [
        (-46.355, 0, 2.413),
    ]]
    chamfer(f6_edges, length=F6_SIZE)

    # F7 (on face) → F8 (cut)
    with BuildSketch(Plane(origin=(0, 0, 0), x_dir=(1, 0, 0), z_dir=(0, 0, -1))):
        with Locations((39.444204, -55.973177)):
            Circle(F7_R)
        with Locations((-60.245562, -5.453398)):
            Circle(F7_R_2)
        with Locations((25.4, 54.900886)):
            Circle(F7_R)
    extrude(amount=-F8_DEPTH, mode=Mode.SUBTRACT)

    # F9 (on face) → F10 (cut, through all)
    with BuildSketch(Plane(origin=(0, 0, 0), x_dir=(1, 0, 0), z_dir=(0, 0, -1))):
        with Locations((56.136862, 18.239972)):
            Circle(F9_R)
        with Locations((-12.272152, -57.735935)):
            Circle(F9_R)
        with Locations((-43.86471, 39.495963)):
            Circle(F9_R)
    extrude(amount=-F10_DEPTH, mode=Mode.SUBTRACT)

    # F11 (on face) → F12 (cut)
    with BuildSketch(Plane(origin=(0, 0, 0), x_dir=(1, 0, 0), z_dir=(0, 0, -1))):
        with Locations((-12.272152, -57.735935)):
            Circle(F11_R)
        with Locations((56.136862, 18.239972)):
            Circle(F11_R)
        with Locations((-43.86471, 39.495963)):
            Circle(F11_R)
    extrude(amount=-F12_DEPTH, mode=Mode.SUBTRACT)


solid = f1.part
